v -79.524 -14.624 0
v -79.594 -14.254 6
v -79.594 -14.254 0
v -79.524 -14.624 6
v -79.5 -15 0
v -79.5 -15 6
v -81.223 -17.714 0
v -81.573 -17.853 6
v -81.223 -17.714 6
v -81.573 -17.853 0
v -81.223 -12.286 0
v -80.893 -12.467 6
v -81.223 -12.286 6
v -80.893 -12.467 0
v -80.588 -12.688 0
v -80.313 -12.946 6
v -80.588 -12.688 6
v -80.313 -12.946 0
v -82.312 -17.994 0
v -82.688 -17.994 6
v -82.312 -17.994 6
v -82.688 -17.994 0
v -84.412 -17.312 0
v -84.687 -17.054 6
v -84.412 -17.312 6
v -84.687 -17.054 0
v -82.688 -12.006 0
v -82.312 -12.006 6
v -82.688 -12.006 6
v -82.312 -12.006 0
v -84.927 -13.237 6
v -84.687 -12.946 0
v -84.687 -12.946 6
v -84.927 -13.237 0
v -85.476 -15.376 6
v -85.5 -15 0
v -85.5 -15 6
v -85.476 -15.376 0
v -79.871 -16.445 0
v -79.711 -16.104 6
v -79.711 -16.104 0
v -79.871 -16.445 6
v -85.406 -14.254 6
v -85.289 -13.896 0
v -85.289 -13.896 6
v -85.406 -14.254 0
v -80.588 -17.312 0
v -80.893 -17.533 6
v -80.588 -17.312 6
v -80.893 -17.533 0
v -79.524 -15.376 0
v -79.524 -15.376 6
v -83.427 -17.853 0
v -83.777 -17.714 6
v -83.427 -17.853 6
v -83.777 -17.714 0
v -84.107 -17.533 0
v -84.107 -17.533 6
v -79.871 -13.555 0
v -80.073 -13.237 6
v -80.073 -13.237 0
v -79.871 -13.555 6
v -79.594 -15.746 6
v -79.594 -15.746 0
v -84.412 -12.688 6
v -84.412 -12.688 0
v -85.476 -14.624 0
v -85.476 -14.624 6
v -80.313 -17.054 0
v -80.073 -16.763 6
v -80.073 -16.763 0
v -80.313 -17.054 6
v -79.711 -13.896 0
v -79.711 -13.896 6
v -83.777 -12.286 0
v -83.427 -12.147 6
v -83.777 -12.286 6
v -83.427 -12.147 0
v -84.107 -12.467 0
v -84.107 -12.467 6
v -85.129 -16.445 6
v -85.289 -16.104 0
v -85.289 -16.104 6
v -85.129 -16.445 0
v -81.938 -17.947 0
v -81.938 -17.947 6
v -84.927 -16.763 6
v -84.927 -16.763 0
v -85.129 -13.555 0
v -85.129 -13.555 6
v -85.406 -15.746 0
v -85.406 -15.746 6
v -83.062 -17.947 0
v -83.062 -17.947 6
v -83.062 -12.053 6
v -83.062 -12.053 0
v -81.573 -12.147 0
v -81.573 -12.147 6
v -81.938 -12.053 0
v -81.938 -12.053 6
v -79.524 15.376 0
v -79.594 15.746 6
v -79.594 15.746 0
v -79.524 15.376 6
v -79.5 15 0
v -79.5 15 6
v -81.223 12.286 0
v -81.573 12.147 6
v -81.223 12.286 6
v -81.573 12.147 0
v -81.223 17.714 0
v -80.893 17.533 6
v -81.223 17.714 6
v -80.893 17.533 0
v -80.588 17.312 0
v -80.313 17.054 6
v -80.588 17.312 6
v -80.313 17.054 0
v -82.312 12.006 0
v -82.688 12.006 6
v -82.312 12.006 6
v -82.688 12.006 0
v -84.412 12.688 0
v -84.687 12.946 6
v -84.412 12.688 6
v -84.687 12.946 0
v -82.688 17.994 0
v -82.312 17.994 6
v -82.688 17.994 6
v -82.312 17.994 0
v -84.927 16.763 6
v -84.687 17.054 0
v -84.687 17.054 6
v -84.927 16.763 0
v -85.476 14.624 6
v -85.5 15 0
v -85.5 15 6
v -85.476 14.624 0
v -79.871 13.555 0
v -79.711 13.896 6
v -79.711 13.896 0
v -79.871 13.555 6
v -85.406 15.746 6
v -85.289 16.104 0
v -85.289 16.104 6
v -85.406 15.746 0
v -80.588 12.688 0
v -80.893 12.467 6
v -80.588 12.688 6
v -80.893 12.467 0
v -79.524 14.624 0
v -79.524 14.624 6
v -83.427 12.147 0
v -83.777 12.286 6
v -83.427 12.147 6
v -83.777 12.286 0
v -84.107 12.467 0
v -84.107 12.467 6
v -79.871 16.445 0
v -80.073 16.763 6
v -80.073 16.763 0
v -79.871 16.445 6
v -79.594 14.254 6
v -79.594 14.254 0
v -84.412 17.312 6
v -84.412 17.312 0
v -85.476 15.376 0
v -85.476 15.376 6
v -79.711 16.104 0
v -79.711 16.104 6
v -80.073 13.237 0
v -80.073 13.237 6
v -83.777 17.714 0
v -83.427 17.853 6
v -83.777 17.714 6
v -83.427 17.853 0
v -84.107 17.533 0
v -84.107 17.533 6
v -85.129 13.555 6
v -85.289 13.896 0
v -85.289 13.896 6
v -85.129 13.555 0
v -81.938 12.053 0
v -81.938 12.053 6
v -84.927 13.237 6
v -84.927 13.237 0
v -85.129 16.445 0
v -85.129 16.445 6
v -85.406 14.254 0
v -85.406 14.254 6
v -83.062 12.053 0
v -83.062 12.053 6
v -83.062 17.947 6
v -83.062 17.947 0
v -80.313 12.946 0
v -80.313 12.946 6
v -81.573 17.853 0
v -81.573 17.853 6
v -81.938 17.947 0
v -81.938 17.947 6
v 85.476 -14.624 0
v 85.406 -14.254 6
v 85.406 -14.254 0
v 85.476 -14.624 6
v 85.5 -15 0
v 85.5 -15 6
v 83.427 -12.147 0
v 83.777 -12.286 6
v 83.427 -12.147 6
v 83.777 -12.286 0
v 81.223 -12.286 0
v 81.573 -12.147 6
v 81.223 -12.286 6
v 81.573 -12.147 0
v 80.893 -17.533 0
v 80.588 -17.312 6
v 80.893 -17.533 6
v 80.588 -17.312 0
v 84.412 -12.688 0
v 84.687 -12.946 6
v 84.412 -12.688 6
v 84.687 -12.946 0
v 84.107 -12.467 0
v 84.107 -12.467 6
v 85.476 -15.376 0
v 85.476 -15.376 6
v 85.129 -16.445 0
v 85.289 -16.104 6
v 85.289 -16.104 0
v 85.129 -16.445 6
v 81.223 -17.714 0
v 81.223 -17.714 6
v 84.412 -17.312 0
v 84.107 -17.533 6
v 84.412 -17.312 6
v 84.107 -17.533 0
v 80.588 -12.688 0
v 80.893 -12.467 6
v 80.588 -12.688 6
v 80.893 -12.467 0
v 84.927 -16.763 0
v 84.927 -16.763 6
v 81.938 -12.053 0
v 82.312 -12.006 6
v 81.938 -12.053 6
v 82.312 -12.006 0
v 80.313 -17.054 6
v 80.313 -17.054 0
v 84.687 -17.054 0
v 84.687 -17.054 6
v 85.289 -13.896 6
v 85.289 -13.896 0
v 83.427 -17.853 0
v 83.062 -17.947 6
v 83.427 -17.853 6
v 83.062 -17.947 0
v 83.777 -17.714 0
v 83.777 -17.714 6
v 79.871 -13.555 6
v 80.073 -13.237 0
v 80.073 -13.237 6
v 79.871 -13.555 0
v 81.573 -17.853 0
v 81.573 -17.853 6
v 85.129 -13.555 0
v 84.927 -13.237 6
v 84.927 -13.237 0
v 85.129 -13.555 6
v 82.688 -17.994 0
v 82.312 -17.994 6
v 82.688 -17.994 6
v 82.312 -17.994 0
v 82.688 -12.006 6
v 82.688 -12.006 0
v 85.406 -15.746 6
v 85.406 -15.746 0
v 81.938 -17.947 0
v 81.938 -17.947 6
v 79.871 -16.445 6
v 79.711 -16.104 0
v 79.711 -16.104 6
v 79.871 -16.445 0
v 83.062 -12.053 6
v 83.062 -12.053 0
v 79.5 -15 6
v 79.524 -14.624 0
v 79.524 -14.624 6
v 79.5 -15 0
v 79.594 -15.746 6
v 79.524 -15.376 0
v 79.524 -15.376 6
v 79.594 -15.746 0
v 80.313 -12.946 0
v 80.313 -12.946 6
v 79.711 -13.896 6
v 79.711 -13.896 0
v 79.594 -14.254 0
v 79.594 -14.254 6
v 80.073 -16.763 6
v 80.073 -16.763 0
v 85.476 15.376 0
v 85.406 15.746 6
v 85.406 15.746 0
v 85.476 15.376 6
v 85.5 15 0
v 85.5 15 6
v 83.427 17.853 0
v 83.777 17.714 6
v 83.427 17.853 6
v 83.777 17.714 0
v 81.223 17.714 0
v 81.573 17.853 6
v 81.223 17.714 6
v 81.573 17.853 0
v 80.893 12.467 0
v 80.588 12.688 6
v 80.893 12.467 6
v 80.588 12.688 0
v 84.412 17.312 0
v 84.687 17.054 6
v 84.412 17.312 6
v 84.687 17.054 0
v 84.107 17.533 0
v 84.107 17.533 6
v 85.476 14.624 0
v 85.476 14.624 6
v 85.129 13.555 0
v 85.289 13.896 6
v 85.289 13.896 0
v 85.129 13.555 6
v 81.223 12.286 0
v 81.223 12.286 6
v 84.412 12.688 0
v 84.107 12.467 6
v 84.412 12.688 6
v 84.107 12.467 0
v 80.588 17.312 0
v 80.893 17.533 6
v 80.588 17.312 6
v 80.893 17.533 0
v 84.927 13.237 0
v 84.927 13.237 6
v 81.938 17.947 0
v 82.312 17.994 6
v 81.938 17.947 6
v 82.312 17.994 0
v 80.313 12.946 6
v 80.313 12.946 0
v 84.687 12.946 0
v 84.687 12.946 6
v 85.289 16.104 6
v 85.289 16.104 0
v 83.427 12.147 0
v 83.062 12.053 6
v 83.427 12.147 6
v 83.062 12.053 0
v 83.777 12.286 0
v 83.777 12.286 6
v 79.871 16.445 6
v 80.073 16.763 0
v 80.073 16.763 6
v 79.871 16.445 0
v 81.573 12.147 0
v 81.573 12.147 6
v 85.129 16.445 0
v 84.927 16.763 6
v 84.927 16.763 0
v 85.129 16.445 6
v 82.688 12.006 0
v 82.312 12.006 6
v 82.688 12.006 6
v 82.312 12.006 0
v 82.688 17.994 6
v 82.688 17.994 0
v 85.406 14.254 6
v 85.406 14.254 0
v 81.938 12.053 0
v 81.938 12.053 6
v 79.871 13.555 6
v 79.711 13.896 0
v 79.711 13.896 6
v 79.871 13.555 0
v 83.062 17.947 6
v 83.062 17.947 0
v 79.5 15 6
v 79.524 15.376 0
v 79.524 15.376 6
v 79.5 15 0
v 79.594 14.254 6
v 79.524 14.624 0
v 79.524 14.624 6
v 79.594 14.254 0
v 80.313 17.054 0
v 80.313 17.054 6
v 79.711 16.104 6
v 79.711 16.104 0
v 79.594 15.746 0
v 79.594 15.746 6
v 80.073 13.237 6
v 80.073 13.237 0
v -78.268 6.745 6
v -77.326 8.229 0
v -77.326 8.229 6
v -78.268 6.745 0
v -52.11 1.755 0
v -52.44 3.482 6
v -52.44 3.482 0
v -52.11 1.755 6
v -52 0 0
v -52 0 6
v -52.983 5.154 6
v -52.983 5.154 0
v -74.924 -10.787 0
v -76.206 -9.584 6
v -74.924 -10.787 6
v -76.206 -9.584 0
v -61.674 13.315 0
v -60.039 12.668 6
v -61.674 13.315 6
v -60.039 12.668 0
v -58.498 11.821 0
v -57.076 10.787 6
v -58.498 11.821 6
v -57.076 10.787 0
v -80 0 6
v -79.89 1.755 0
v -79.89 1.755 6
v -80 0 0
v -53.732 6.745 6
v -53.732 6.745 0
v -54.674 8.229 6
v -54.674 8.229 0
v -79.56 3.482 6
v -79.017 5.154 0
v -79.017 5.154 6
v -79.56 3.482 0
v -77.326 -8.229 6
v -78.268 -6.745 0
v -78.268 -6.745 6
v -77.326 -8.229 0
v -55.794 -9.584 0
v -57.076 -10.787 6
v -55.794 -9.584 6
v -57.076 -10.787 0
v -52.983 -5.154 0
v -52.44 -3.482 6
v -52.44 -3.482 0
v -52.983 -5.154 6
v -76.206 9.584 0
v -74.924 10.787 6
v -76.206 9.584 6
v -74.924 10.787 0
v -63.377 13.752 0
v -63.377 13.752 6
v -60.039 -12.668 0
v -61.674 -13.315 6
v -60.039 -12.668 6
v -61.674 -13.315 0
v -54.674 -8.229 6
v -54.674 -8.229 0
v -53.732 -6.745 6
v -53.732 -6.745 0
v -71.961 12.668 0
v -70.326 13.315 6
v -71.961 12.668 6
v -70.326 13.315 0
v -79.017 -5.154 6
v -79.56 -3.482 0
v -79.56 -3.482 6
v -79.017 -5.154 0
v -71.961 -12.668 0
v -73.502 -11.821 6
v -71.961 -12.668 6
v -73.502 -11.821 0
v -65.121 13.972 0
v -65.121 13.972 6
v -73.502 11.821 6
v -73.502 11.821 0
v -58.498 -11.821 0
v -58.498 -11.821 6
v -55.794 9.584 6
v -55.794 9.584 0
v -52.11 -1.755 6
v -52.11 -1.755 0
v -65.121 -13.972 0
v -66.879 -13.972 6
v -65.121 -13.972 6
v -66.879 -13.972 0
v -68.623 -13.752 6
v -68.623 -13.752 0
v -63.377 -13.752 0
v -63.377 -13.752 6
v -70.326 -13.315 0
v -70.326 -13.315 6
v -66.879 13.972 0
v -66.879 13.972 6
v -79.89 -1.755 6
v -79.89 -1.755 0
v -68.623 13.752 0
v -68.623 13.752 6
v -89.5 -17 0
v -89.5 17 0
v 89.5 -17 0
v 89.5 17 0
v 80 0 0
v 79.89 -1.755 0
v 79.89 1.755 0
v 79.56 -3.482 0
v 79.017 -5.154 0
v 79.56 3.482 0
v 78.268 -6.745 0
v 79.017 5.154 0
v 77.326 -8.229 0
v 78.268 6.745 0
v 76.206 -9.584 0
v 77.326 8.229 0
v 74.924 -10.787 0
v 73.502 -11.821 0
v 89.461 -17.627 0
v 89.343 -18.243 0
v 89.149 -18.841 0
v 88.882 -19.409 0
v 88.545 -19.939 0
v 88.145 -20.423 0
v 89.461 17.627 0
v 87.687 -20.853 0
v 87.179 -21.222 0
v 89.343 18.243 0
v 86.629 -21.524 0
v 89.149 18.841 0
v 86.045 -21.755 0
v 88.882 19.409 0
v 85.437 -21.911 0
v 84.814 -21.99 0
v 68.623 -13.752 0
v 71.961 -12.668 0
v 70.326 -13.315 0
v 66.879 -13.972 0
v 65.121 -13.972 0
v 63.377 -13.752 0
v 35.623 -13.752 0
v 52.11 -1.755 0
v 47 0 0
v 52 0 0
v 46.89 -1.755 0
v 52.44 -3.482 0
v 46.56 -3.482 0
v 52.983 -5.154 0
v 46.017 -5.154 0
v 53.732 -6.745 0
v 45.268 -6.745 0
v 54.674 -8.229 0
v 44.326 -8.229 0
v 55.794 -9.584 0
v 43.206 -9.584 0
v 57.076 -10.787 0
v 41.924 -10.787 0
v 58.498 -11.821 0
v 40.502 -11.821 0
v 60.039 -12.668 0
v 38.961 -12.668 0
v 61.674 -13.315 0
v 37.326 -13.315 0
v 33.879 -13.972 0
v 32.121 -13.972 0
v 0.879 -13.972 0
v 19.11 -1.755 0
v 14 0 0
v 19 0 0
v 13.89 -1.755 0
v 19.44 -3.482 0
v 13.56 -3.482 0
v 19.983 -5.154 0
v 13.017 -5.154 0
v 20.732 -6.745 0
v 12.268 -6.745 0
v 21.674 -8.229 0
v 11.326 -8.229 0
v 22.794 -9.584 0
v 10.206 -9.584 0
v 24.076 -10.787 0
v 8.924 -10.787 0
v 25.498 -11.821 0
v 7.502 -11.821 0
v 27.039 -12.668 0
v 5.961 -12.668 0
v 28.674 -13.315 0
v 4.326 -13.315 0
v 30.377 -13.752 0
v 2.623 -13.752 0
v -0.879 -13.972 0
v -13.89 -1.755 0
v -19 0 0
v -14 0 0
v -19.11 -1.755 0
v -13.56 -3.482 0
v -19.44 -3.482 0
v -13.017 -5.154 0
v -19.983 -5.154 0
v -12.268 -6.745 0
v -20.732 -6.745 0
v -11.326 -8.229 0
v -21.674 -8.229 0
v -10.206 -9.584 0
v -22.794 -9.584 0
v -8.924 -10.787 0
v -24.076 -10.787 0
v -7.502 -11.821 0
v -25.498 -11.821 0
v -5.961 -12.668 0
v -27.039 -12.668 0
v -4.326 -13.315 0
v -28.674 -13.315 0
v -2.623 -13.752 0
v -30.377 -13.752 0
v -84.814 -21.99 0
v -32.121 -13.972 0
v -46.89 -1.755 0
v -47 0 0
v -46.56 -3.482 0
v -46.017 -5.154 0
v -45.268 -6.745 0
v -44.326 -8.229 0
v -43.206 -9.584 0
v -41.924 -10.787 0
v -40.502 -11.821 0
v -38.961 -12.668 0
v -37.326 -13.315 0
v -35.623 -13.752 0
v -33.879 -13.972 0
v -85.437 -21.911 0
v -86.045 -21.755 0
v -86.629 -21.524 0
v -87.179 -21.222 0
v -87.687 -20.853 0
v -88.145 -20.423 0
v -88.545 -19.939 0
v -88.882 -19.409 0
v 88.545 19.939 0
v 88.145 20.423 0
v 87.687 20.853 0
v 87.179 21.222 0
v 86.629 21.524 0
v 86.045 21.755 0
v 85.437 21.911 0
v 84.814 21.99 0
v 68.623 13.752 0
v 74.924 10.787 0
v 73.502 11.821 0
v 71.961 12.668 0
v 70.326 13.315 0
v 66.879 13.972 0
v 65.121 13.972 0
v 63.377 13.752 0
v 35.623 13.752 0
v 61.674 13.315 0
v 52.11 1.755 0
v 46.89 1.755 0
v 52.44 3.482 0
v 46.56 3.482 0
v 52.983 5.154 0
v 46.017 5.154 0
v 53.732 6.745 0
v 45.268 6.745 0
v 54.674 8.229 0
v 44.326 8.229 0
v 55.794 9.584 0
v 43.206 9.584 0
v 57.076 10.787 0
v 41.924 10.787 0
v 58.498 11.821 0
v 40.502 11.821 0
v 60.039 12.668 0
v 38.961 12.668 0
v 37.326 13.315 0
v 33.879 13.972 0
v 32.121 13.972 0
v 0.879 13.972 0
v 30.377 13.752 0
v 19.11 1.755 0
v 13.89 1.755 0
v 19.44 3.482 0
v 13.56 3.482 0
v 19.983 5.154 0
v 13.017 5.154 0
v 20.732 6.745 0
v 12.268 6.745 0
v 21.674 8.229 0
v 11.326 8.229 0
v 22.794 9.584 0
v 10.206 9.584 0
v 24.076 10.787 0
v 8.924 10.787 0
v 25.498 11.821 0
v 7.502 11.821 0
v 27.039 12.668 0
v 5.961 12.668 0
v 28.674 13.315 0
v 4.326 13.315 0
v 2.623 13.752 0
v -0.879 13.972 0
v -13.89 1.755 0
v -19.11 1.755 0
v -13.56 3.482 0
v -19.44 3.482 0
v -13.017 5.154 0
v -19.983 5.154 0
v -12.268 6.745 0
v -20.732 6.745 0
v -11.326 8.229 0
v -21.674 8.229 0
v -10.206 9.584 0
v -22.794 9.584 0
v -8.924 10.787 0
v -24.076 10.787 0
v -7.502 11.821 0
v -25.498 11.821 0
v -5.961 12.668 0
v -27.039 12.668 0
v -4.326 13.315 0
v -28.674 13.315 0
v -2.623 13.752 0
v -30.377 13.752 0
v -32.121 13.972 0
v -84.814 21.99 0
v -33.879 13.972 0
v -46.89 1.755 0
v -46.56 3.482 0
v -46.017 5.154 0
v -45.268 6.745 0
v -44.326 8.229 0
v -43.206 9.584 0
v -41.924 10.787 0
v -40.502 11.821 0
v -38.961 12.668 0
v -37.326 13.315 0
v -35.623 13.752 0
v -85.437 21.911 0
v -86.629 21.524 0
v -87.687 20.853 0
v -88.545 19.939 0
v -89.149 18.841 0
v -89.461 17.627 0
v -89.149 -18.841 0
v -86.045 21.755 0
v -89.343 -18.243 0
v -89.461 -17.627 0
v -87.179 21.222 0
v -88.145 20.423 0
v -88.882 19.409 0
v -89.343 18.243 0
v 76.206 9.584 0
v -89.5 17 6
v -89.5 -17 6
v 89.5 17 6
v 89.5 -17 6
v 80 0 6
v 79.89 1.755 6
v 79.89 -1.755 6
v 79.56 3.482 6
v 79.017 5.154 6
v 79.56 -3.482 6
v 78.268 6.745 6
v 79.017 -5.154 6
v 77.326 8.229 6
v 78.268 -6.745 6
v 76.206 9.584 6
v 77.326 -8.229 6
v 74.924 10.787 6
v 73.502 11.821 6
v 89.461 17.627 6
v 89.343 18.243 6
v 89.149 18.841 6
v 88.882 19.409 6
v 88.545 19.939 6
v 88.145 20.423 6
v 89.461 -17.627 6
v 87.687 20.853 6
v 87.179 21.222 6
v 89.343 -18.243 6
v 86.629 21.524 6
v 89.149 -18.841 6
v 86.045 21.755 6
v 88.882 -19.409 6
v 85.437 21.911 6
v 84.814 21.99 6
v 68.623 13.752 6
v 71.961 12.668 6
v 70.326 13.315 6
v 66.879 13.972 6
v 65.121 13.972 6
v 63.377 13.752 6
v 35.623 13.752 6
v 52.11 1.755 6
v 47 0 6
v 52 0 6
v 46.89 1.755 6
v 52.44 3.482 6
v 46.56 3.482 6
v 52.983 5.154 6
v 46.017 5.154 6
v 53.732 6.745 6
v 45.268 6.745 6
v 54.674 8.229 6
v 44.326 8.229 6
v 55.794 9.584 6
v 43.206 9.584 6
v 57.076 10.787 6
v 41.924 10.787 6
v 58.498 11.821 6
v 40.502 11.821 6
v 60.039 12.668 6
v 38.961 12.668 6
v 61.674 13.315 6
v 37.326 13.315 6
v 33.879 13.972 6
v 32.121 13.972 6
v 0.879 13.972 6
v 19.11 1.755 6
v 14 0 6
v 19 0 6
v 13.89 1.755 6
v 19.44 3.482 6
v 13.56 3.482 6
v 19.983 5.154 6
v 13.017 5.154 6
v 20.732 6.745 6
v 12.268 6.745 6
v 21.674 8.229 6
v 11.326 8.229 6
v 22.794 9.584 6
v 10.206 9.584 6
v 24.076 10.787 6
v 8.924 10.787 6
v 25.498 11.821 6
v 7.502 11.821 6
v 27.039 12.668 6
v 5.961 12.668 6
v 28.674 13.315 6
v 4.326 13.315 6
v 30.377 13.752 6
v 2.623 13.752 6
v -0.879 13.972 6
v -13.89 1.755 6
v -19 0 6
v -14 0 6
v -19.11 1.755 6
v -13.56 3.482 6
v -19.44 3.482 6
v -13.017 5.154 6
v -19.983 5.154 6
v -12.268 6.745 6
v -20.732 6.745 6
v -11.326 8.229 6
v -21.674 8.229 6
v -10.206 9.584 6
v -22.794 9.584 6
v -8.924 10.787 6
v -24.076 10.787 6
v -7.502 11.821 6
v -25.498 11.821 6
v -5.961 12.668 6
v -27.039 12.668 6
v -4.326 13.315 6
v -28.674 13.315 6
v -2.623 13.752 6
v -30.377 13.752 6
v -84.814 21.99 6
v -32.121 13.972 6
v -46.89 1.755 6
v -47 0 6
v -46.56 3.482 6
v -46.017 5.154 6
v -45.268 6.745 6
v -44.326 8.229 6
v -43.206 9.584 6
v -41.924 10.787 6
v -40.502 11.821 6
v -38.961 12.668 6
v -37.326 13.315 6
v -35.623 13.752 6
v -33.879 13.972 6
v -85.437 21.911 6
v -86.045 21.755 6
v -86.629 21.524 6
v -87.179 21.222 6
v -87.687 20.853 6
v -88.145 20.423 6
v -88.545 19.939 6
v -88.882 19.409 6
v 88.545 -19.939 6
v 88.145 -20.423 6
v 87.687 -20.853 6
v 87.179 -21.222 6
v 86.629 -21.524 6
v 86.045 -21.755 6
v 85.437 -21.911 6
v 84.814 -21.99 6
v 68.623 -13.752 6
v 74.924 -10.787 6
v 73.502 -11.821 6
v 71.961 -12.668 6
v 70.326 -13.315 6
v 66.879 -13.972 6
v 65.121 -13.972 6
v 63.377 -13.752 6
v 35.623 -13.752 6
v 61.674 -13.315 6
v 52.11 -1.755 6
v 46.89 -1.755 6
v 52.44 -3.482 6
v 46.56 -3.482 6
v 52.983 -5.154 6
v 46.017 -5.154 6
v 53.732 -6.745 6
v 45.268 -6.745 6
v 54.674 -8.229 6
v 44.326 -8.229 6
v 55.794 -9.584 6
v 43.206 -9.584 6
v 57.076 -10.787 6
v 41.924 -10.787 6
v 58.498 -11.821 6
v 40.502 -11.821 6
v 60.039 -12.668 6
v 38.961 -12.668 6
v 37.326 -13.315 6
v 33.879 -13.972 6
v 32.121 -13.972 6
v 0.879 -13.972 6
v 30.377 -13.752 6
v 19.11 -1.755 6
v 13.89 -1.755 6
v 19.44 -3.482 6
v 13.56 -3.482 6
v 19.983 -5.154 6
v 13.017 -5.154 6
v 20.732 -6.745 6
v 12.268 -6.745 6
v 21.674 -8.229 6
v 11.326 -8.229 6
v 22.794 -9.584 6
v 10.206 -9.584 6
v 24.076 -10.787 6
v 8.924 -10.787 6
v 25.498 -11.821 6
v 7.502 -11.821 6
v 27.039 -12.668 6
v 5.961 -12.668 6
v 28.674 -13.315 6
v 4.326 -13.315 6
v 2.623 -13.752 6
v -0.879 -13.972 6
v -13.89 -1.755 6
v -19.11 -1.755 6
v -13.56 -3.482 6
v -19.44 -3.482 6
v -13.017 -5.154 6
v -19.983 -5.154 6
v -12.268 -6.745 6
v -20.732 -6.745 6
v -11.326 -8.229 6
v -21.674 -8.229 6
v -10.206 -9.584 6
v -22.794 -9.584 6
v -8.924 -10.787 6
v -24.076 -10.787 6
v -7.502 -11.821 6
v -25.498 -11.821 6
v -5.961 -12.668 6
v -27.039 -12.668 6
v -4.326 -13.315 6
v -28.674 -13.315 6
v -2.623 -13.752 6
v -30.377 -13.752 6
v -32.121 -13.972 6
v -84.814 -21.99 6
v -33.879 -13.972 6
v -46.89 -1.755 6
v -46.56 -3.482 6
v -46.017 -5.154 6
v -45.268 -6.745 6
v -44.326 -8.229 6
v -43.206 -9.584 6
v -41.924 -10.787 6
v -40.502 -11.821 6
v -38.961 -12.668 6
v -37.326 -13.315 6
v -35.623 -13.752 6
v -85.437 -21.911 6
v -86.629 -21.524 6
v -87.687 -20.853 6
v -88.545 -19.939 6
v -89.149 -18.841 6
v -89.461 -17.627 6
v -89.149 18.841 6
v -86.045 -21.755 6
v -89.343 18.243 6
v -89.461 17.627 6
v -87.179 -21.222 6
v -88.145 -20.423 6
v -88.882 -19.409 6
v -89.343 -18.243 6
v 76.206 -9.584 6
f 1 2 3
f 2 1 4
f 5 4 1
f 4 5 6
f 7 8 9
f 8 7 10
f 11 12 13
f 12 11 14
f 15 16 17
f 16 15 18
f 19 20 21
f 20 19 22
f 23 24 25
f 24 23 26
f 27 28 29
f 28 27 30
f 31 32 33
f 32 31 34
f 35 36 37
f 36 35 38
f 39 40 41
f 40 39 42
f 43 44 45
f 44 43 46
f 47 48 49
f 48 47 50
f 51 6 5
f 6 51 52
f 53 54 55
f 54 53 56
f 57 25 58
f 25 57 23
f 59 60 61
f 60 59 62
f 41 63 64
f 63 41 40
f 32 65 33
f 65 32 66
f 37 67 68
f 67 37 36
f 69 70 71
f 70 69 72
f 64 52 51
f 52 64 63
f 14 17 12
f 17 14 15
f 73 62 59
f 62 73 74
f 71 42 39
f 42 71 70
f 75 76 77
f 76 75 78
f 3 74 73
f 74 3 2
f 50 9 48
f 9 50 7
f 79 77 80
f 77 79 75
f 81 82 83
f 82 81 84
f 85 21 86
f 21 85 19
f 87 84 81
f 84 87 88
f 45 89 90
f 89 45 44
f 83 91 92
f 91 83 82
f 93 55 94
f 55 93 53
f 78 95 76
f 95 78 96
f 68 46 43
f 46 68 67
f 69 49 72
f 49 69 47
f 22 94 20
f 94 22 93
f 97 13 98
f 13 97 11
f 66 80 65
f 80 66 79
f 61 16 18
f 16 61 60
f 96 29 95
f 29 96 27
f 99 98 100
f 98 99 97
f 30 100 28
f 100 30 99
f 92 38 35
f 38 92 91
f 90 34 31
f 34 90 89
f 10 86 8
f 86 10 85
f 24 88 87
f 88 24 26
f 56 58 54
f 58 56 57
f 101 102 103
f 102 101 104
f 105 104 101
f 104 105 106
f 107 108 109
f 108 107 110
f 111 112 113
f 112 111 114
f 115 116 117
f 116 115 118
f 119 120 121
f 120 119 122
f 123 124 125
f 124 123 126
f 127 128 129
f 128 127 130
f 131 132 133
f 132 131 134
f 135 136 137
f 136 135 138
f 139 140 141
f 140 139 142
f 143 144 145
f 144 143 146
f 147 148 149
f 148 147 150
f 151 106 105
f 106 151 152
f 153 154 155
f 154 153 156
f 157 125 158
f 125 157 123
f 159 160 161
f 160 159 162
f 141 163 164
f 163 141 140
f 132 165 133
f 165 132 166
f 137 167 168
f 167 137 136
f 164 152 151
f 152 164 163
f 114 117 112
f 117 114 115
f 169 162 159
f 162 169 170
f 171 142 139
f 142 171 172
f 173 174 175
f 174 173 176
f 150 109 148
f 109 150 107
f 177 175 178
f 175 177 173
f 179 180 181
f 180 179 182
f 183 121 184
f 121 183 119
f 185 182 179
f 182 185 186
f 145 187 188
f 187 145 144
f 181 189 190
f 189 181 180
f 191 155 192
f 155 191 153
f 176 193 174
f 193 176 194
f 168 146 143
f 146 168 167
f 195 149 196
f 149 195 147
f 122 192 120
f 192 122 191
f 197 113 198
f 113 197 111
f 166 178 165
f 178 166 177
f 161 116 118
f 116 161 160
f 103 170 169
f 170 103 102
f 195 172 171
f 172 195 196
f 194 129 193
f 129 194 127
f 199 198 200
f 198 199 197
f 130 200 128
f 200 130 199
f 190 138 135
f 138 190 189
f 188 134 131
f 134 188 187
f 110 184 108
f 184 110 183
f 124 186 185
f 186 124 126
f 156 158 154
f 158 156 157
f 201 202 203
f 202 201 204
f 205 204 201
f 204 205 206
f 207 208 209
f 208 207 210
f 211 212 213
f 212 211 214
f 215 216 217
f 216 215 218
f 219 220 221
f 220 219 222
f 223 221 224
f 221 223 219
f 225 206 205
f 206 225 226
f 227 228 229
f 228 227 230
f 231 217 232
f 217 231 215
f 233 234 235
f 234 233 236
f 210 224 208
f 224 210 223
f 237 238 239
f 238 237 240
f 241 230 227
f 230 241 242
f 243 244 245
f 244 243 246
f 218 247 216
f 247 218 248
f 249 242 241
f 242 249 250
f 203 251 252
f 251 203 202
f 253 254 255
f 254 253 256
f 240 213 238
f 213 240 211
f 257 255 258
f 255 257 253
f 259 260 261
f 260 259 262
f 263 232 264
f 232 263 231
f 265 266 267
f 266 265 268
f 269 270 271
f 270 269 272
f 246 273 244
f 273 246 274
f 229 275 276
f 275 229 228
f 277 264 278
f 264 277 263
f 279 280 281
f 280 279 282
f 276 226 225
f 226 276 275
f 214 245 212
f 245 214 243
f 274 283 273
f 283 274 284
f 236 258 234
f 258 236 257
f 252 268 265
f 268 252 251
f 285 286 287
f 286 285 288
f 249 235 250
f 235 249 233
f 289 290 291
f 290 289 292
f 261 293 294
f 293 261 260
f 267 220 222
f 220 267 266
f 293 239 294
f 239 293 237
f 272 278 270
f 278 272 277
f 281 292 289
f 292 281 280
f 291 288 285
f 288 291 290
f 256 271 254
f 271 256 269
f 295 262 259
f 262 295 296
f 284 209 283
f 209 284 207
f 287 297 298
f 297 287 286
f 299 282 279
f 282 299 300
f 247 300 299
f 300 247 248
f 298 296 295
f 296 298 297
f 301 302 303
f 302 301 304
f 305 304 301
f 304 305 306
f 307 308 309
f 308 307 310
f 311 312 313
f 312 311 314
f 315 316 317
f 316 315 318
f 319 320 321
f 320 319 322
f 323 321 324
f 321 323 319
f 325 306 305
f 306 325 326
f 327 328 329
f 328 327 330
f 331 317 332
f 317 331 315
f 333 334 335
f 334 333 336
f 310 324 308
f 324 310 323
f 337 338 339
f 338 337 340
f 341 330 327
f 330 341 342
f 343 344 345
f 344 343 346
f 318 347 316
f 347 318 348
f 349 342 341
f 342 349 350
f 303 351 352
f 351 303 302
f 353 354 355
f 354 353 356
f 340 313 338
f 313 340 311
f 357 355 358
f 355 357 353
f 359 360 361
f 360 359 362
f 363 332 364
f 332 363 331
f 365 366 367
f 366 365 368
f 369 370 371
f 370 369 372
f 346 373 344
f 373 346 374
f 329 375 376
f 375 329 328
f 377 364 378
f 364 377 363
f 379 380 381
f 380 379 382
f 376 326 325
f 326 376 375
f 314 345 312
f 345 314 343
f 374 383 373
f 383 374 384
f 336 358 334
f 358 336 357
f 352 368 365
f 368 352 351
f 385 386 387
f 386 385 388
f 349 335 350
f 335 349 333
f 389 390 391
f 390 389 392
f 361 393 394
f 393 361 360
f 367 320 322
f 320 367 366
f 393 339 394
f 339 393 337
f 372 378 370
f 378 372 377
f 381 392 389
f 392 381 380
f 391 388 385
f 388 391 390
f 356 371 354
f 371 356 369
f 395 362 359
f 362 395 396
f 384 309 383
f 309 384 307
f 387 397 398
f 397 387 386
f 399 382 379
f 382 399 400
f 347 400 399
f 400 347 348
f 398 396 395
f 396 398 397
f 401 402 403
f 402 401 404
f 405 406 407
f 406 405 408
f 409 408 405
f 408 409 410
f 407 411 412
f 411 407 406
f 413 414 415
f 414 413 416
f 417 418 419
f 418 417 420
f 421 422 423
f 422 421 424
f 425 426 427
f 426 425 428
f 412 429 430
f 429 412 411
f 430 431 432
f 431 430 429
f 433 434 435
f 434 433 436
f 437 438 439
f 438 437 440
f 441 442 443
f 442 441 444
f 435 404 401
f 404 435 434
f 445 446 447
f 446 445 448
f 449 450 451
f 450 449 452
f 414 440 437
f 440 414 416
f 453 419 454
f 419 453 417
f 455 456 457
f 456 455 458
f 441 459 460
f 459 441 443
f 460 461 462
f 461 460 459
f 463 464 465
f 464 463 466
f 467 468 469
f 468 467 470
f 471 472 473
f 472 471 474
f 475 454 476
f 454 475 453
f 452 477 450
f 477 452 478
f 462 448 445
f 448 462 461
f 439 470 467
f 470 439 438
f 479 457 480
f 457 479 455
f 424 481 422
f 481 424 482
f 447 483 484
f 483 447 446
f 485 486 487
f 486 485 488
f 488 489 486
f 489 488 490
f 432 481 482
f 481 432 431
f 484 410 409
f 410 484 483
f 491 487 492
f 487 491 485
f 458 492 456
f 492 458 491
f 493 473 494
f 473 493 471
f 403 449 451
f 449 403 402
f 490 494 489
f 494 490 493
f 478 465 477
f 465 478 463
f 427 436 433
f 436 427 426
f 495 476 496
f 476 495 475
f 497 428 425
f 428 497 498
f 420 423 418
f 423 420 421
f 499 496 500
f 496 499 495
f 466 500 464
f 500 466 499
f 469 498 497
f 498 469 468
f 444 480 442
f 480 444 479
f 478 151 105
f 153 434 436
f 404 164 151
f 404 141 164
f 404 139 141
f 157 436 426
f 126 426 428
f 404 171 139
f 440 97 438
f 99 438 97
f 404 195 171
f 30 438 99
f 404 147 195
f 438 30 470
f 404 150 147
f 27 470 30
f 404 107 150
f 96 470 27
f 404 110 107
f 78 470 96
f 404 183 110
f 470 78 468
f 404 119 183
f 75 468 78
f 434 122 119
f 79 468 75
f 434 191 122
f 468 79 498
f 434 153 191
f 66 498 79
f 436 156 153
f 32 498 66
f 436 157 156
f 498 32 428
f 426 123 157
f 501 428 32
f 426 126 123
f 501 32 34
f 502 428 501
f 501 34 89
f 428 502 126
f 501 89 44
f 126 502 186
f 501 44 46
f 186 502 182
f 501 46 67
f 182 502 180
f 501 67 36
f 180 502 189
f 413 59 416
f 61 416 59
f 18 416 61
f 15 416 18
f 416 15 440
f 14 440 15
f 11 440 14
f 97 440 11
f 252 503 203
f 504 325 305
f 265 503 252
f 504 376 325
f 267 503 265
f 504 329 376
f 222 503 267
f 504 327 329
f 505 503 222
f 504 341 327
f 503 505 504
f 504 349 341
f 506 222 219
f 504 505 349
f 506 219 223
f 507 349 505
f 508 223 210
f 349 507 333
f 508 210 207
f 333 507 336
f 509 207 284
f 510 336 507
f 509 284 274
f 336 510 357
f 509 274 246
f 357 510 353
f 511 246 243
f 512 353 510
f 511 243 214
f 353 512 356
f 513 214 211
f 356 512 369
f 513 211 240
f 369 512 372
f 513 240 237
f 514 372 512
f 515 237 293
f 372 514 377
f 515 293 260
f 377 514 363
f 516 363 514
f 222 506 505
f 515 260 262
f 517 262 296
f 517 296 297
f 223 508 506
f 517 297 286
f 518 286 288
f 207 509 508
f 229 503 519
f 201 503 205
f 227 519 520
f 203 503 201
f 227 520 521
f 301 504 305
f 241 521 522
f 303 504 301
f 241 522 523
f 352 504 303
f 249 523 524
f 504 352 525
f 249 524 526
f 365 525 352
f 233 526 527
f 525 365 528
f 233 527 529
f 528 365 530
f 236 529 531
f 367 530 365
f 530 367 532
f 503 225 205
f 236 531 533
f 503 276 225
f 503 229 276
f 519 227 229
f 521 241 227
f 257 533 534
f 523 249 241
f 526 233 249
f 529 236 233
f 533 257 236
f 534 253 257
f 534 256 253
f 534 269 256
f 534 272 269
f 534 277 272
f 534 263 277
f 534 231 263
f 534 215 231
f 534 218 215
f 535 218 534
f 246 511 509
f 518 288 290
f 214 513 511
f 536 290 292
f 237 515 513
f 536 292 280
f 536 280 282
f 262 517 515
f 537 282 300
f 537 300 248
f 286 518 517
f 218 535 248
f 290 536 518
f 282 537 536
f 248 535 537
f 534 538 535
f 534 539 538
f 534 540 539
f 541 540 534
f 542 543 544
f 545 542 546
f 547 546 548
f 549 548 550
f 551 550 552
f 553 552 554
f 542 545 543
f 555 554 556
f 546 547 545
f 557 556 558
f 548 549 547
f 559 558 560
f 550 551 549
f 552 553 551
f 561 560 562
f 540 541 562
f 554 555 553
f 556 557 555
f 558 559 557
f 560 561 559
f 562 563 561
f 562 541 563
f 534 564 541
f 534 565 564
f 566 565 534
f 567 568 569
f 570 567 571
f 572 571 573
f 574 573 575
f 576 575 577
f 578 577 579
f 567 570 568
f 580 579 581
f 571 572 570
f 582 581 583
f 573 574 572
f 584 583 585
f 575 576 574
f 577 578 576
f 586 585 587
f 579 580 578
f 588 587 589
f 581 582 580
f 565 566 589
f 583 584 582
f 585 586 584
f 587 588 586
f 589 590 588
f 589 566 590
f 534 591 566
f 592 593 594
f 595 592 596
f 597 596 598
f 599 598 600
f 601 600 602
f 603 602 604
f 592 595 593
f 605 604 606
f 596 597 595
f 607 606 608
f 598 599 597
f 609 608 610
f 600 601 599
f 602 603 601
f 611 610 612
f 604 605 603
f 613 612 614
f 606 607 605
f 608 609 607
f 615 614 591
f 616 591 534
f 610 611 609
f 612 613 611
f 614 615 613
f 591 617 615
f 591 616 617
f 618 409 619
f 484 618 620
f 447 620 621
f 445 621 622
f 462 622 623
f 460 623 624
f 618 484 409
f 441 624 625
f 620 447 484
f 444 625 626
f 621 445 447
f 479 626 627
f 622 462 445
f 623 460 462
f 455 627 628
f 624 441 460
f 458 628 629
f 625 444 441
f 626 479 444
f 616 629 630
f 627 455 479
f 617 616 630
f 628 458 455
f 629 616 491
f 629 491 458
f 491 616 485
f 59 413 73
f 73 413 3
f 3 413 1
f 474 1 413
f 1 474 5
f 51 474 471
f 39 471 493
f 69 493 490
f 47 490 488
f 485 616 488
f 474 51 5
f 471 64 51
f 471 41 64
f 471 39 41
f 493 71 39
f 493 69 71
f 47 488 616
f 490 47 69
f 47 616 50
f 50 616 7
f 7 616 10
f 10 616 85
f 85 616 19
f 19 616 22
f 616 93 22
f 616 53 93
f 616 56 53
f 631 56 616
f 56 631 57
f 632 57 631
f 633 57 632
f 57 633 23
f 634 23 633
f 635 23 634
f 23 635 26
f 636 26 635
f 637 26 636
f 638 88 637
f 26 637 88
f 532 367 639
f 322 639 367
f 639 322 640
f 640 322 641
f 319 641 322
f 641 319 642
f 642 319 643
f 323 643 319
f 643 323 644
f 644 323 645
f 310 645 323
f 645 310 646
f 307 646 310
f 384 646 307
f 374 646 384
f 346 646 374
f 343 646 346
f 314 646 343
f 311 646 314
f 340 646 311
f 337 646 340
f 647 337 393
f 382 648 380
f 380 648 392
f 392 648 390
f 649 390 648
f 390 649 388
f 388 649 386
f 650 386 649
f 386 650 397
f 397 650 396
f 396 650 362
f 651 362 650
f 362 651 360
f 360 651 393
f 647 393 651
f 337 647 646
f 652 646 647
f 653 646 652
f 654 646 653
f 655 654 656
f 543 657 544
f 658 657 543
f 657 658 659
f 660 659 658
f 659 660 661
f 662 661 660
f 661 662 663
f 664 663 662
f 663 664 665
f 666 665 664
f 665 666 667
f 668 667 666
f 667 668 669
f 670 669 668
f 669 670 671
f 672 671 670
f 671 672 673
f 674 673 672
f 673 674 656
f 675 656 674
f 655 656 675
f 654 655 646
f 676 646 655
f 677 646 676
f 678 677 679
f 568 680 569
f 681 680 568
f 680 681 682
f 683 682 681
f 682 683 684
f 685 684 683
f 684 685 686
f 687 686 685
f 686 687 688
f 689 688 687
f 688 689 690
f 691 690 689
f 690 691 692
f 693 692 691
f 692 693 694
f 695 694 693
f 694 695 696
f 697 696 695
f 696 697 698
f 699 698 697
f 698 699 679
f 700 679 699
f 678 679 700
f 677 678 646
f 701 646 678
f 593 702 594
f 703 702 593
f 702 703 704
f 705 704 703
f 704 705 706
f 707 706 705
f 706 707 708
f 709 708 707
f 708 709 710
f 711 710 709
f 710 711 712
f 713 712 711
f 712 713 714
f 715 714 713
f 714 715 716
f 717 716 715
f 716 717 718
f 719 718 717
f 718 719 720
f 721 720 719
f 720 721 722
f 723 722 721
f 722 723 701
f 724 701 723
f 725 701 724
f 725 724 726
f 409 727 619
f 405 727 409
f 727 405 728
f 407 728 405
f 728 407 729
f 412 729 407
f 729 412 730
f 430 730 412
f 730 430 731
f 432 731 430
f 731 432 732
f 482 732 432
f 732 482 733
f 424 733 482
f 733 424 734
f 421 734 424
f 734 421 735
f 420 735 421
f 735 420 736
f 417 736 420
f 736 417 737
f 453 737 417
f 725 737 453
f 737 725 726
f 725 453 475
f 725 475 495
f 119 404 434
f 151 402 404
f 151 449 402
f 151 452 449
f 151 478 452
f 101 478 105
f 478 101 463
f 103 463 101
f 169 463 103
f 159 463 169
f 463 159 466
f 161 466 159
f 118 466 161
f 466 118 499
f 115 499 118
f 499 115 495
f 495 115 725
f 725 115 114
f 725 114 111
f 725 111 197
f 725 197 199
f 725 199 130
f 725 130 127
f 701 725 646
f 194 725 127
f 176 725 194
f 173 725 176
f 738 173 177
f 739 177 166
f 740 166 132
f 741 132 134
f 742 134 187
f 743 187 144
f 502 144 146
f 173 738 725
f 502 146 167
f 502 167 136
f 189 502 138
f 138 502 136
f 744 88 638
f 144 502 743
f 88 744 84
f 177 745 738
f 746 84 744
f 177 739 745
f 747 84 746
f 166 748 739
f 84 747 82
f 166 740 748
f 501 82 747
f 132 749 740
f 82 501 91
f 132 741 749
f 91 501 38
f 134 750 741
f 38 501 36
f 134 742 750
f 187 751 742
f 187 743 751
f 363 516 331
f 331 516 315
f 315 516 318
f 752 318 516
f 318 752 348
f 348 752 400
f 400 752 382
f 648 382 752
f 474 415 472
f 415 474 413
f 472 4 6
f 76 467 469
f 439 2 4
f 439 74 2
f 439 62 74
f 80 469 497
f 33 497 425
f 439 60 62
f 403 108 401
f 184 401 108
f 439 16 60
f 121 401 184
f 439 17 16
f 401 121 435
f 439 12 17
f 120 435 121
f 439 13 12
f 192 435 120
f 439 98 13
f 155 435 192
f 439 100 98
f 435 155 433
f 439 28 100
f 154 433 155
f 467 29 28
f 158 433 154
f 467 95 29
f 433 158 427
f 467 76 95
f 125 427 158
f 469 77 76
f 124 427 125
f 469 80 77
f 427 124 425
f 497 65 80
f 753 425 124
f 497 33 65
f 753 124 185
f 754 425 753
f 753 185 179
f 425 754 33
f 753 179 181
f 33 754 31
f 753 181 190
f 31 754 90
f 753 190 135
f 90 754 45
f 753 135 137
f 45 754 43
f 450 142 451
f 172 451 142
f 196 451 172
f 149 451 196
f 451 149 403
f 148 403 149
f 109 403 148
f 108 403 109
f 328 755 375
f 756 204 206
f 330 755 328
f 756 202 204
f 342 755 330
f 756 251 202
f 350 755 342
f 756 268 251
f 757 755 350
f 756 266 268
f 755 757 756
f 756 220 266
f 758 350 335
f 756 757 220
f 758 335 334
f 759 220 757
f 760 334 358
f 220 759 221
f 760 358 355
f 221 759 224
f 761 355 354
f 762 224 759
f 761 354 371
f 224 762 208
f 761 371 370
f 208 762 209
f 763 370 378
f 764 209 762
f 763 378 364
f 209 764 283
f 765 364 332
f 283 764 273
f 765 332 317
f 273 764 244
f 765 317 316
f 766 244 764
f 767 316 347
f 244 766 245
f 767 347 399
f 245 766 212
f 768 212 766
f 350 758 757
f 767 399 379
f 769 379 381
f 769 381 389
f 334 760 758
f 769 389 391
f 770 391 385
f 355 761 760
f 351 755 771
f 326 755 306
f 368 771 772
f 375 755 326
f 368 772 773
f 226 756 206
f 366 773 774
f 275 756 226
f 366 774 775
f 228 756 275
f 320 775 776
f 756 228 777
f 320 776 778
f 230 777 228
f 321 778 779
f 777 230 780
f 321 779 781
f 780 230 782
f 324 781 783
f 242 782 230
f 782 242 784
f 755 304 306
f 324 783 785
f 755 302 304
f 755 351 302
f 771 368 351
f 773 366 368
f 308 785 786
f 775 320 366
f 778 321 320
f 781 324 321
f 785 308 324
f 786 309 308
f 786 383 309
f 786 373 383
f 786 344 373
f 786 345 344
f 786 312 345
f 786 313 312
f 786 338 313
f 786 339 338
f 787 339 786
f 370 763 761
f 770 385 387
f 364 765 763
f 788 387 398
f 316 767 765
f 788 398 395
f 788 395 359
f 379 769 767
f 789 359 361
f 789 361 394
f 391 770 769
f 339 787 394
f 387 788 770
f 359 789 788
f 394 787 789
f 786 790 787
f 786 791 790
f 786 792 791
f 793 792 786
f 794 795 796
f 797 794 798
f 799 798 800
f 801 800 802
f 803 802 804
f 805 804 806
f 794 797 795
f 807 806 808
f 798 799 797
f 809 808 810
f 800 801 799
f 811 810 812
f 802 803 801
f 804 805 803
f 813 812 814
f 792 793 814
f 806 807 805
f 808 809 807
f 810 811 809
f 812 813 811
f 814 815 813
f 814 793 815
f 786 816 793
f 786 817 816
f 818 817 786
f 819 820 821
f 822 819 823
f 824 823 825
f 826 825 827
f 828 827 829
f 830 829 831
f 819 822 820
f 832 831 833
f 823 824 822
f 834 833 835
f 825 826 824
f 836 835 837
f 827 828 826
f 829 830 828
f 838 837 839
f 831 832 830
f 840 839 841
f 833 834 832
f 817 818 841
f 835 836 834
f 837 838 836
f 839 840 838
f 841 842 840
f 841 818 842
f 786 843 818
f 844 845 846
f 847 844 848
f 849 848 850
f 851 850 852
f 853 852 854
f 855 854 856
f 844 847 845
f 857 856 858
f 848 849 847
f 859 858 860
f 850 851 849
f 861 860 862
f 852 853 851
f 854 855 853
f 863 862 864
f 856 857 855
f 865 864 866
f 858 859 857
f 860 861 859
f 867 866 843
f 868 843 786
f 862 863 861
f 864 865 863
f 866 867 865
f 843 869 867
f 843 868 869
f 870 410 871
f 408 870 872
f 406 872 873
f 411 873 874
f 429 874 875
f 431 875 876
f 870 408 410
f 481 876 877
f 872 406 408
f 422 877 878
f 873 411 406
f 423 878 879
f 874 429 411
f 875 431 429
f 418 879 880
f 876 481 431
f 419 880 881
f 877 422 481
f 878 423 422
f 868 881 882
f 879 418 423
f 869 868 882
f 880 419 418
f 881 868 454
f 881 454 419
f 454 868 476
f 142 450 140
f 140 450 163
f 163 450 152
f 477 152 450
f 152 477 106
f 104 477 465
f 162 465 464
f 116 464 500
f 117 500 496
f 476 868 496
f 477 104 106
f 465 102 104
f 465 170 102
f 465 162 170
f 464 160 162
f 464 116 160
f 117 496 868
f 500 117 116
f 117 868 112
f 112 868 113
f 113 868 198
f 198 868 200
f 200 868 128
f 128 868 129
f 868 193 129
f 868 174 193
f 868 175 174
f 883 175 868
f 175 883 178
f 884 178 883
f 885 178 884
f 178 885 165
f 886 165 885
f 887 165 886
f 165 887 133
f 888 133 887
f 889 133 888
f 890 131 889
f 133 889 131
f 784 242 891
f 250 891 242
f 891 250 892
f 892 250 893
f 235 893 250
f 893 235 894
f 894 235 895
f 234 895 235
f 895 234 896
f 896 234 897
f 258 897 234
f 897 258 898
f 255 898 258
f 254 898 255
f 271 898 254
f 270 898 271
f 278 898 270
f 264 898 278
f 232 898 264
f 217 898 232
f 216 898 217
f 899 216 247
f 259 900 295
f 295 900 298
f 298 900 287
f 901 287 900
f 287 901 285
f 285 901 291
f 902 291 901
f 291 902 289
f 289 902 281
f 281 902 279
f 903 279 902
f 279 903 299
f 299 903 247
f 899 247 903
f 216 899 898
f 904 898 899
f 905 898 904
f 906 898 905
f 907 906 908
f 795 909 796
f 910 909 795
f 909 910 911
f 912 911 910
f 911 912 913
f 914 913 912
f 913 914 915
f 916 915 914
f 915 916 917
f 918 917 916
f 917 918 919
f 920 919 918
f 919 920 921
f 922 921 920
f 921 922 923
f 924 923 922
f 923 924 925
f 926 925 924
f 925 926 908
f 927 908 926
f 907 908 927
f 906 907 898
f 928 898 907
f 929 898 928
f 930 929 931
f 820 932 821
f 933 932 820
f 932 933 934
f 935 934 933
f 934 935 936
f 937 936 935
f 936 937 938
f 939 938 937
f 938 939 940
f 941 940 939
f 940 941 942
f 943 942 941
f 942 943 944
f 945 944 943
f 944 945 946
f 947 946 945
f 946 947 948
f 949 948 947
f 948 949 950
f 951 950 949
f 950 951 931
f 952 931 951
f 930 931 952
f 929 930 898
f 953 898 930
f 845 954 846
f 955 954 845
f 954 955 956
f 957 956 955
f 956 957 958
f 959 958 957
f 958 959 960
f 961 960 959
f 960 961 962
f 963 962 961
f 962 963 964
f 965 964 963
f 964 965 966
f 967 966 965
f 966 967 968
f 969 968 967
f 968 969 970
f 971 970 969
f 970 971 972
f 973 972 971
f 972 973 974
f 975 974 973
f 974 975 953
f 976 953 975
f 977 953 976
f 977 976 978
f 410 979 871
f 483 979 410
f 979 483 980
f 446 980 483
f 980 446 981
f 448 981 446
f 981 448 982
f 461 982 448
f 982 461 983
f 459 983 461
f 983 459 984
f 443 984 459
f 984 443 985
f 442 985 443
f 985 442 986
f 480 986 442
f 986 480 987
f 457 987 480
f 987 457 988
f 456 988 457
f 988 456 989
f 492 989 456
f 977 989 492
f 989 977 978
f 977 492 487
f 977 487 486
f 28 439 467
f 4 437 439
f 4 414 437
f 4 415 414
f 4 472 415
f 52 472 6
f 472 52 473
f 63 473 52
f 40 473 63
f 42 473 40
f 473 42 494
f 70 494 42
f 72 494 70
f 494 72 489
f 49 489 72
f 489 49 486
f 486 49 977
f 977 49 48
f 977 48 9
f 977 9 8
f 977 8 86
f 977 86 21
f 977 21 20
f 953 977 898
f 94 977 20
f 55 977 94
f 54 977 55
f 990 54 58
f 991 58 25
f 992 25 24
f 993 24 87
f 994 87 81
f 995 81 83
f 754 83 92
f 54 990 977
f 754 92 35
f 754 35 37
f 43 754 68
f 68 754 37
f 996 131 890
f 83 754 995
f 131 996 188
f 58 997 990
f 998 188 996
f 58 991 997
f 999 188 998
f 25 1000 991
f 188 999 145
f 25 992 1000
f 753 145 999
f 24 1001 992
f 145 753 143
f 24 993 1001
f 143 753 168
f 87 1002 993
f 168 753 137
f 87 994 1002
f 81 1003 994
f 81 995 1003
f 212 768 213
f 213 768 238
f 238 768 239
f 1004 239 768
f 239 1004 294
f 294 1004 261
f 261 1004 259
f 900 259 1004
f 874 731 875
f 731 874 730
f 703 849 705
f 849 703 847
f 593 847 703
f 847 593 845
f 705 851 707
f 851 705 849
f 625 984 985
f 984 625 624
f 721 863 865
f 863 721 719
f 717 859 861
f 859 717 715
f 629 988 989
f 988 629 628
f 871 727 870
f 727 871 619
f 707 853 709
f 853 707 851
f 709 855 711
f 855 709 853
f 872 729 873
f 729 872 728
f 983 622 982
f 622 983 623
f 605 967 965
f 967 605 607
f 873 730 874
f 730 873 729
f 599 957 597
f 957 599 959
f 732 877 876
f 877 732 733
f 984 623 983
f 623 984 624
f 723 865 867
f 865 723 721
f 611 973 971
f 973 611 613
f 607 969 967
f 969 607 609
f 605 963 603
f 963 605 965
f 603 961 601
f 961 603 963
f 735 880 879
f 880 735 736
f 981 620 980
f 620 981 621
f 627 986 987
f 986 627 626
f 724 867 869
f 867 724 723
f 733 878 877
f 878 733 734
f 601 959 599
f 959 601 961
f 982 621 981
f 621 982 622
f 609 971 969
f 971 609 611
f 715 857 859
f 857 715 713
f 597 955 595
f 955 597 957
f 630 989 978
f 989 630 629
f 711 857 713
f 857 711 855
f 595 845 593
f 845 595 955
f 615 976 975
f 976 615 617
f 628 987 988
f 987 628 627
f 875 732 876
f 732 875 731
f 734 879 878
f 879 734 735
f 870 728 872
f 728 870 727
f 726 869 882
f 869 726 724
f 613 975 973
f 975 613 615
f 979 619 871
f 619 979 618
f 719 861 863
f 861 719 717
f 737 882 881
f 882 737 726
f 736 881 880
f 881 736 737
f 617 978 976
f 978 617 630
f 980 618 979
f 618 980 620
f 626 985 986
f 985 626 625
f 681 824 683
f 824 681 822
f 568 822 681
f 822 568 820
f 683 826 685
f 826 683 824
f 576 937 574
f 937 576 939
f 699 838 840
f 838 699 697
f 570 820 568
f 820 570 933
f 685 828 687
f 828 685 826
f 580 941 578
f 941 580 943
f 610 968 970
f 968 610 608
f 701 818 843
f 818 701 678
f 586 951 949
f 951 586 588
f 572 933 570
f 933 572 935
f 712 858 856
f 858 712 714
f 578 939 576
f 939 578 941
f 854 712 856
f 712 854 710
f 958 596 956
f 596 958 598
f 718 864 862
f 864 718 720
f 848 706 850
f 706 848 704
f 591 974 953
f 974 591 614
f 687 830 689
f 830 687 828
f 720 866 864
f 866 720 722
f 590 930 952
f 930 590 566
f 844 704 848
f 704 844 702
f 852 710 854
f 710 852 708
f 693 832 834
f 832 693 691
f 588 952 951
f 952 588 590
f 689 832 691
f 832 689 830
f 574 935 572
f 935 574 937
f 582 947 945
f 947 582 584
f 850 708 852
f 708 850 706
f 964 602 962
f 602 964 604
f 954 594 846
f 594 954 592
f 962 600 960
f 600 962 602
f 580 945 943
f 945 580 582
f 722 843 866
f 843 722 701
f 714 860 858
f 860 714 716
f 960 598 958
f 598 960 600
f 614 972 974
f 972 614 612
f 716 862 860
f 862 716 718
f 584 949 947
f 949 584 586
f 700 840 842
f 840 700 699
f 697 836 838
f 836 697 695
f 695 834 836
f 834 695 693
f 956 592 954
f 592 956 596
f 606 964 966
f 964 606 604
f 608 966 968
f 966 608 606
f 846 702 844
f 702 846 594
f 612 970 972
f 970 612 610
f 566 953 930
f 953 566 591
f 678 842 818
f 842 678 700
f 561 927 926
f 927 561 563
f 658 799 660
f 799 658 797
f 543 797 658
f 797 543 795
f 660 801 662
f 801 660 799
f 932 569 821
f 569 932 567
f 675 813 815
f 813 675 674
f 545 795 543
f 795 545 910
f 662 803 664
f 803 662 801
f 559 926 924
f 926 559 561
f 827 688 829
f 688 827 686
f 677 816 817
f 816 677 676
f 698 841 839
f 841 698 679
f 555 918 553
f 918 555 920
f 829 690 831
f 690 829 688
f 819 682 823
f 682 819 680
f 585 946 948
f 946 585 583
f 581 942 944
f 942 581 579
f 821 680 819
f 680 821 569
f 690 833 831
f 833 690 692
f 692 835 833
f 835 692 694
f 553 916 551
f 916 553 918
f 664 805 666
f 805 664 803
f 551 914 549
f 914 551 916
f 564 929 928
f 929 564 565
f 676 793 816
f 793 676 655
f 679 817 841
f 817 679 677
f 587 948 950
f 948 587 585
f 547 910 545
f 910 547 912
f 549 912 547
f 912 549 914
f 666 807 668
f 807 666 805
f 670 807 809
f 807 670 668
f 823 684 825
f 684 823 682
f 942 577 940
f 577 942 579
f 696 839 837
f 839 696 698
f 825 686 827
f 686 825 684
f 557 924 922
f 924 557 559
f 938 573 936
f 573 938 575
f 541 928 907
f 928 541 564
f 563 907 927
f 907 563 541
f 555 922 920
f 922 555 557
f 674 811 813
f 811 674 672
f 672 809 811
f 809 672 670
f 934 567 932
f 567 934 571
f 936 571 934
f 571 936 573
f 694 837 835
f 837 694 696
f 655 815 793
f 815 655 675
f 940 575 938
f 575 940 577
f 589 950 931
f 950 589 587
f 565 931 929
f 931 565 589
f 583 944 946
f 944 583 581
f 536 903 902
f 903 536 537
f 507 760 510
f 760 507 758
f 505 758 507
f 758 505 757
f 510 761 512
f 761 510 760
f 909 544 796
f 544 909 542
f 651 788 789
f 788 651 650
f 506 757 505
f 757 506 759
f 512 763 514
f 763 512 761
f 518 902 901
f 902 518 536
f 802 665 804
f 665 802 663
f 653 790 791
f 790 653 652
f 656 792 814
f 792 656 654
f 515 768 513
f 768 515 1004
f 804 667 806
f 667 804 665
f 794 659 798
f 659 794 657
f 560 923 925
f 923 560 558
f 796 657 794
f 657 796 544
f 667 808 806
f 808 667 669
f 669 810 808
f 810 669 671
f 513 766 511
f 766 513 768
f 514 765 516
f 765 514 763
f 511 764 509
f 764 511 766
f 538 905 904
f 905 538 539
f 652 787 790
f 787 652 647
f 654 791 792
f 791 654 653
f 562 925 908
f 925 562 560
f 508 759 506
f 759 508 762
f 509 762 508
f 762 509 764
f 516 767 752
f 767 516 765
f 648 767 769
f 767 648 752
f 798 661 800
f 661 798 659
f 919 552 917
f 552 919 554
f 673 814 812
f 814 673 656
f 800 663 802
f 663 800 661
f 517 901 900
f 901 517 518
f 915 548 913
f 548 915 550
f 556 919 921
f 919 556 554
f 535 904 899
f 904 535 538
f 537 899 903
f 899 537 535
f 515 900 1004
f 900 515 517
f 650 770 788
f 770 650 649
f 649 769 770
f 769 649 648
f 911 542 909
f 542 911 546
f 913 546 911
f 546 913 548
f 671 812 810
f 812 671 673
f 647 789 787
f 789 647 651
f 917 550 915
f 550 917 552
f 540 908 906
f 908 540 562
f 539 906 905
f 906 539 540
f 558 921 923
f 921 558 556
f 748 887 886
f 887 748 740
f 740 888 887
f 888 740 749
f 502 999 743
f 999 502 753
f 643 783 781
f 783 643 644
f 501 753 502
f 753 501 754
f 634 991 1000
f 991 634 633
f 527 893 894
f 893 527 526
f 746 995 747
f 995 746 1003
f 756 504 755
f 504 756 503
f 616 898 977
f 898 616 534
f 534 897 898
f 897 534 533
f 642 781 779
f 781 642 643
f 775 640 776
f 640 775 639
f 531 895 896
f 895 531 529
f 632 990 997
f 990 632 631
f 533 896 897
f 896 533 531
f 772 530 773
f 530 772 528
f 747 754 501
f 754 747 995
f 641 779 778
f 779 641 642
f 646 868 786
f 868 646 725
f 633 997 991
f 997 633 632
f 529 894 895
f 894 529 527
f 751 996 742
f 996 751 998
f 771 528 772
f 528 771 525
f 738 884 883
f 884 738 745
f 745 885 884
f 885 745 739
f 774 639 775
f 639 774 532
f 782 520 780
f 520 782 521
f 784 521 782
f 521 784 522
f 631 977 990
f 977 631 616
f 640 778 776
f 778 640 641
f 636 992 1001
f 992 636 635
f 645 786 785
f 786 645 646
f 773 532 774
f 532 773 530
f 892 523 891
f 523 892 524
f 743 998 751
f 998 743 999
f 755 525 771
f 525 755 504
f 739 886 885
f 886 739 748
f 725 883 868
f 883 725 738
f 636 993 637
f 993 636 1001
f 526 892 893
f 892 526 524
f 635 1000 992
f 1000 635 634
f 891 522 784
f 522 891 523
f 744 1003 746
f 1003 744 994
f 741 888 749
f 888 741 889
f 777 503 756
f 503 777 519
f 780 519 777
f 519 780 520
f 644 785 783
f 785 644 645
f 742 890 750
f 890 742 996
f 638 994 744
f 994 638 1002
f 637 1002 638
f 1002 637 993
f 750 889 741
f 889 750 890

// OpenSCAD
$fn = 50;


difference() {
	union() {
		hull() {
			translate(v = [-84.5000000000, 17.0000000000, 0]) {
				cylinder(h = 6, r = 5);
			}
			translate(v = [84.5000000000, 17.0000000000, 0]) {
				cylinder(h = 6, r = 5);
			}
			translate(v = [-84.5000000000, -17.0000000000, 0]) {
				cylinder(h = 6, r = 5);
			}
			translate(v = [84.5000000000, -17.0000000000, 0]) {
				cylinder(h = 6, r = 5);
			}
		}
	}
	union() {
		#translate(v = [-82.5000000000, -15.0000000000, -100.0000000000]) {
			cylinder(h = 200, r = 3.0000000000);
		}
		#translate(v = [-82.5000000000, 15.0000000000, -100.0000000000]) {
			cylinder(h = 200, r = 3.0000000000);
		}
		#translate(v = [82.5000000000, -15.0000000000, -100.0000000000]) {
			cylinder(h = 200, r = 3.0000000000);
		}
		#translate(v = [82.5000000000, 15.0000000000, -100.0000000000]) {
			cylinder(h = 200, r = 3.0000000000);
		}
		#translate(v = [-66.0000000000, 0, 0]) {
			cylinder(h = 6, r = 14.0000000000);
		}
		#translate(v = [-33.0000000000, 0, 0]) {
			cylinder(h = 6, r = 14.0000000000);
		}
		#cylinder(h = 6, r = 14.0000000000);
		#translate(v = [33.0000000000, 0, 0]) {
			cylinder(h = 6, r = 14.0000000000);
		}
		#translate(v = [66.0000000000, 0, 0]) {
			cylinder(h = 6, r = 14.0000000000);
		}
	}
}
